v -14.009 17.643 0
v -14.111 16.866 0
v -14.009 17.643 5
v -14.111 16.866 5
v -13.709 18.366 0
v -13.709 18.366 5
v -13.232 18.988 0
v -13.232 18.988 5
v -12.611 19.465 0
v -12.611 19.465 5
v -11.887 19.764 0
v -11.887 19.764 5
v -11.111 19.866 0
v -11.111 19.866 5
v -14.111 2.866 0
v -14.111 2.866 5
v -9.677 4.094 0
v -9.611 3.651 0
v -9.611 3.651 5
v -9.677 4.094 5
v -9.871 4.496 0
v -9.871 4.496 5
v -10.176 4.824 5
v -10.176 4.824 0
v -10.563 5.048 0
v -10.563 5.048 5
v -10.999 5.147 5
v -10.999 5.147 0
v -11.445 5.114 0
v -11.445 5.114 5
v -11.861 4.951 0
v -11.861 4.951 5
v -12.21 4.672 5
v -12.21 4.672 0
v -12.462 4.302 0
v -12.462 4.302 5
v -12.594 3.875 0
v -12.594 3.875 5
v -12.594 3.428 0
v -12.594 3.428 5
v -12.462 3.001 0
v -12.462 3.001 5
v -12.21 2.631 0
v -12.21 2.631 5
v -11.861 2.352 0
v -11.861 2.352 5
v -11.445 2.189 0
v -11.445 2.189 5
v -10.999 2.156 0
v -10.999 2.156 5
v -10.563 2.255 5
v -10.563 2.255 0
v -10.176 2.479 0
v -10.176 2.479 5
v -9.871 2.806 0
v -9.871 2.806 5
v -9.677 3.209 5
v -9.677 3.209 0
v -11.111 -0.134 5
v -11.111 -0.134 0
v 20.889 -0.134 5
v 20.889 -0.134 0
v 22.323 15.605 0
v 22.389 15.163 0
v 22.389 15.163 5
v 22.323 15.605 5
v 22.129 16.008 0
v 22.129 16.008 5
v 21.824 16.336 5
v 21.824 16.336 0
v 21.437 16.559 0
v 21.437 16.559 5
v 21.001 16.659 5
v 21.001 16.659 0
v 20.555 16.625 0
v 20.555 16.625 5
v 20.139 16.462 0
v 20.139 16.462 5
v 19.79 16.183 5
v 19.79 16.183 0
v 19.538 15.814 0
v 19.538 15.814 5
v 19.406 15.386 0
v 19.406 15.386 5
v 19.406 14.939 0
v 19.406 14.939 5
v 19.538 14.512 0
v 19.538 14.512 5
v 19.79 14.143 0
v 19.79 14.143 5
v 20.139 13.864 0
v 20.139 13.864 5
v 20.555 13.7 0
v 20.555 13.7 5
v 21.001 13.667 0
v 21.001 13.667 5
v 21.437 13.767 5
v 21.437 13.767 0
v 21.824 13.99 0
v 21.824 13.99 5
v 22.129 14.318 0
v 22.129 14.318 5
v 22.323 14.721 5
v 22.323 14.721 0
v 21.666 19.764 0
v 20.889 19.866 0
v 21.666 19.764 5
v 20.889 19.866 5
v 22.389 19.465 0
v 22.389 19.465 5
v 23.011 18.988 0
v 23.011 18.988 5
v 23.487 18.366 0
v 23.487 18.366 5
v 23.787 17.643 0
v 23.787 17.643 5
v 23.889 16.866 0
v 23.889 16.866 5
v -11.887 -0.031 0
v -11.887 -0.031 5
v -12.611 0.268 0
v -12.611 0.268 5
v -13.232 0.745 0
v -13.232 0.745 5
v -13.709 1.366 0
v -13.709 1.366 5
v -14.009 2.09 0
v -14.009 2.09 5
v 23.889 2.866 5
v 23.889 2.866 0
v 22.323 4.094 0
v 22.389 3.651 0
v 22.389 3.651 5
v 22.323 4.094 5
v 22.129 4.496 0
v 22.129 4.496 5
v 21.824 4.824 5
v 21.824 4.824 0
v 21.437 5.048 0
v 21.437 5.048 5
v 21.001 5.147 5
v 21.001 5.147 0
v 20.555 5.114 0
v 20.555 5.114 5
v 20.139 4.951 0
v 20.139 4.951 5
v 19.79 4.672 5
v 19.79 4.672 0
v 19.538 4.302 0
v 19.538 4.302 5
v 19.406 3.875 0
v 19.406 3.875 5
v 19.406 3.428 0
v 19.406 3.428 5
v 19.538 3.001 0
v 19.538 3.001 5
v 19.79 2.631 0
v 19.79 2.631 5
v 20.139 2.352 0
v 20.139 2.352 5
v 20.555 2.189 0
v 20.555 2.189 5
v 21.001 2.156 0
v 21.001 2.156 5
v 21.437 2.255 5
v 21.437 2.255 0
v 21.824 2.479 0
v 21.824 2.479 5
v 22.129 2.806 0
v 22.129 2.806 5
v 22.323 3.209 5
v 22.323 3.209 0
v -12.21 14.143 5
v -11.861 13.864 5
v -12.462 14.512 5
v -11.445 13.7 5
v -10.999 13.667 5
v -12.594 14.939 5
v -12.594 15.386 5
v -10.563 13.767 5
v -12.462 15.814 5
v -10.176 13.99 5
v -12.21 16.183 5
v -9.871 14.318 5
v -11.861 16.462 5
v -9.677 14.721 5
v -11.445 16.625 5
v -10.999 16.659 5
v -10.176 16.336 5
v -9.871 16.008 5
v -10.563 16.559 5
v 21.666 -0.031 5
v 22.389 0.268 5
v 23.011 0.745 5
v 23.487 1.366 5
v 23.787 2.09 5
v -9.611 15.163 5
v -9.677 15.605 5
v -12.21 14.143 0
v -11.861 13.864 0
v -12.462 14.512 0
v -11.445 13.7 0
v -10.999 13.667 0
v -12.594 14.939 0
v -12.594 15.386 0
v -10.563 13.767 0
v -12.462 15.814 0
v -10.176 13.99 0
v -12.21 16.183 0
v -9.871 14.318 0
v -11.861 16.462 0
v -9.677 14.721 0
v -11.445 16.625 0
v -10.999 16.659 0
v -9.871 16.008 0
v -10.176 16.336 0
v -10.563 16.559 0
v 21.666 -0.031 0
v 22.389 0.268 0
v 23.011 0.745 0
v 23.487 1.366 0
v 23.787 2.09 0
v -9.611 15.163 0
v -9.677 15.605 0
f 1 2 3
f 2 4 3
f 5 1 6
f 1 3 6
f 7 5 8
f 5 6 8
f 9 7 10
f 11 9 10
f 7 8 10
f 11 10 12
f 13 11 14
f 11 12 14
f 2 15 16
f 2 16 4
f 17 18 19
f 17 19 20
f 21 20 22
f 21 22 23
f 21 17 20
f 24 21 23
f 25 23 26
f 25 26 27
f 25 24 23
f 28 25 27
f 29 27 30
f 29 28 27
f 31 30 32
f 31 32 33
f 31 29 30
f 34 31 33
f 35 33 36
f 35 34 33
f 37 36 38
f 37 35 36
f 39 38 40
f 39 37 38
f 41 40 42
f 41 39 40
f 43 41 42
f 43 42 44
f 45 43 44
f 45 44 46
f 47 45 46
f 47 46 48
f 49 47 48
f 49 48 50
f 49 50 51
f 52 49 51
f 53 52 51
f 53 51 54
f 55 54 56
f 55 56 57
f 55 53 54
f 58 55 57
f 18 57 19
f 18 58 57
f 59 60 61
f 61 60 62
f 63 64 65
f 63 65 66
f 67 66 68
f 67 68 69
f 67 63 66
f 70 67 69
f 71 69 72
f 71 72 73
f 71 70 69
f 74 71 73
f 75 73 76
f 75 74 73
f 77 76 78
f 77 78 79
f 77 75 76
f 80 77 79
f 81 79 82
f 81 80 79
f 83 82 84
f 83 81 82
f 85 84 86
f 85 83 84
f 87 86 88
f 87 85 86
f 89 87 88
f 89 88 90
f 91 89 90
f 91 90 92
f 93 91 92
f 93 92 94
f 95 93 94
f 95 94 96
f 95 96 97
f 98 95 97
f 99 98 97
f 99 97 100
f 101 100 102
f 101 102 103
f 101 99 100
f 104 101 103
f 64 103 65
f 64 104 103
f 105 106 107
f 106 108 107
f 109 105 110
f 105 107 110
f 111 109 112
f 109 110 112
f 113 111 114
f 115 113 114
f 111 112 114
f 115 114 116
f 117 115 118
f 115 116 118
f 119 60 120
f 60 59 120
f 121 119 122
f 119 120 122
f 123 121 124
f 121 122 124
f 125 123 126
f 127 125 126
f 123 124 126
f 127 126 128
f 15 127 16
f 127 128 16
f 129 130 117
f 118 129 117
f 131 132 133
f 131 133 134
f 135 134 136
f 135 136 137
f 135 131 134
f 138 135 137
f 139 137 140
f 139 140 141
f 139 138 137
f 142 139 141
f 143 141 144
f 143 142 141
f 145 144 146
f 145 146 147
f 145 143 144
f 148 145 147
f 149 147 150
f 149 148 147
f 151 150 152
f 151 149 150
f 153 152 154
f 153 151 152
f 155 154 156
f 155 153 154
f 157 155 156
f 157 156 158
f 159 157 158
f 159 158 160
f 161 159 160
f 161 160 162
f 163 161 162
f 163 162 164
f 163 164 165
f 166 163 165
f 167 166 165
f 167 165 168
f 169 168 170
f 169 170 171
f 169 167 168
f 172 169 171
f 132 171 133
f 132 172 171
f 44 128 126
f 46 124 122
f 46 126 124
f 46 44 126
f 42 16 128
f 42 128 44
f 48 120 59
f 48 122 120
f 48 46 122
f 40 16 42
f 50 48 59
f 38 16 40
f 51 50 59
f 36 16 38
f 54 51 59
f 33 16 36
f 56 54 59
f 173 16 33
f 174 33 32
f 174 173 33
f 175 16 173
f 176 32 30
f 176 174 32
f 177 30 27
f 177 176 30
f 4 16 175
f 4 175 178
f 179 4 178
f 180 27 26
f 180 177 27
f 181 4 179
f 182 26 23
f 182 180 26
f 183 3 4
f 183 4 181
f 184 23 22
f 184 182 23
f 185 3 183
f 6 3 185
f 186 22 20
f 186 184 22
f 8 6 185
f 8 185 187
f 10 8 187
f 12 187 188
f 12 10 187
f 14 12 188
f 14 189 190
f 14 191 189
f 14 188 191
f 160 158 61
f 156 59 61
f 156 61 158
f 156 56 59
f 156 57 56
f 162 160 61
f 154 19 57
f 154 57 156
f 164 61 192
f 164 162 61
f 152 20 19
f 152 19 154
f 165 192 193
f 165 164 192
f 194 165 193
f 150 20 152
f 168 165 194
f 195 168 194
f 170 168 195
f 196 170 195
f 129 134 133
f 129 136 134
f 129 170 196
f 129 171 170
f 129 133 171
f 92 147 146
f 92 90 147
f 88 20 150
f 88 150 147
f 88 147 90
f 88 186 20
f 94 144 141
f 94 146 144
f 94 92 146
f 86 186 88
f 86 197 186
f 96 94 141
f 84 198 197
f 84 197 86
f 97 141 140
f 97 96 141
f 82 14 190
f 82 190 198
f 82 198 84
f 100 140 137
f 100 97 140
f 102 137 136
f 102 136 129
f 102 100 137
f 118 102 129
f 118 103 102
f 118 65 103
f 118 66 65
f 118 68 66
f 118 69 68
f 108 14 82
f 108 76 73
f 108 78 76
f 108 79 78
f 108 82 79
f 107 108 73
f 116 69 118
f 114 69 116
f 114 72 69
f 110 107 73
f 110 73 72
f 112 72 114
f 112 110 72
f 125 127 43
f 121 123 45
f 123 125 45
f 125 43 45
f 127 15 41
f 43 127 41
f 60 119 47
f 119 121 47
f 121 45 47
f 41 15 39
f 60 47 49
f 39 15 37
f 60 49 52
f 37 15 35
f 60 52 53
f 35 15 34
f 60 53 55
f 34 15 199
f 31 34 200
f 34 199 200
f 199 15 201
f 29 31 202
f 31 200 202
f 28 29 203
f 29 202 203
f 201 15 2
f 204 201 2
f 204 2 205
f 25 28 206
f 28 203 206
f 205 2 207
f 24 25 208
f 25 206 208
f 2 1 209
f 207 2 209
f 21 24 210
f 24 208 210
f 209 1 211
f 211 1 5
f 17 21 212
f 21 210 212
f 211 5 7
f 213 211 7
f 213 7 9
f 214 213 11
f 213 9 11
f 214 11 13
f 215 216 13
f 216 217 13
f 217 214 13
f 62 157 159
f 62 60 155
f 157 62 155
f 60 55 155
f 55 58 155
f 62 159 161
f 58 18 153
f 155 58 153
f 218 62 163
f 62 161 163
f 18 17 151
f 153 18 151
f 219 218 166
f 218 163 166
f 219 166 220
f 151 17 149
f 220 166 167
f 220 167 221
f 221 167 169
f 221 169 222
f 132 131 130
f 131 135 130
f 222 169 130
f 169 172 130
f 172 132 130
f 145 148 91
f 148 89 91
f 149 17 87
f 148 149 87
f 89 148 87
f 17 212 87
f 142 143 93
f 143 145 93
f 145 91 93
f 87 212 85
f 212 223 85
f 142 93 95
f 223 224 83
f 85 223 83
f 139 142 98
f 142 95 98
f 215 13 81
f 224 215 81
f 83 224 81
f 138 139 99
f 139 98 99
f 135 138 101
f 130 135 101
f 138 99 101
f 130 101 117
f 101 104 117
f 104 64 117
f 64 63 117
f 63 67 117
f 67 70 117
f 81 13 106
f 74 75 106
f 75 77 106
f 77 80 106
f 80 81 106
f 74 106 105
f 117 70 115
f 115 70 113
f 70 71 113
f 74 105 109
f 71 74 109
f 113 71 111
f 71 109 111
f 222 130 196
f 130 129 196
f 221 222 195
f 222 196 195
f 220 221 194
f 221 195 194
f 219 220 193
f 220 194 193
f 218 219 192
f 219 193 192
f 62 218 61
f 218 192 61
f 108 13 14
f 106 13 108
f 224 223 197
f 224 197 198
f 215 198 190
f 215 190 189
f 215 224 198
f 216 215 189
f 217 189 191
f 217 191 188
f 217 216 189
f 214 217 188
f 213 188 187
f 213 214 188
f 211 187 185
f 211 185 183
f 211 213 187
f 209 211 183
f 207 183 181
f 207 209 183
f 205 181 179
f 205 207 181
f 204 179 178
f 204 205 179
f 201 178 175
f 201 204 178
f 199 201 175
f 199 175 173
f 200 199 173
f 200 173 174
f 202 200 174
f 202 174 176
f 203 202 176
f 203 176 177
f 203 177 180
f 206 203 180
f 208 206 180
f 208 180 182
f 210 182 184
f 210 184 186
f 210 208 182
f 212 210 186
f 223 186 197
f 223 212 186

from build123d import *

# Parameters (mm, degrees)
SKETCH1_W           = 38
SKETCH1_H           = 20
SKETCH1_R           = 1.5
BOSS_EXTRUDE1_DEPTH = 5
FILLET1_R           = 3
FILLET2_R           = 3
FILLET3_R           = 3
FILLET4_R           = 3


with BuildPart() as part:
    # Sketch1 → Boss-Extrude1 (new body)
    with BuildSketch(Plane.XY):
        with Locations((4.889250814, 9.866449511)):
            Rectangle(SKETCH1_W, SKETCH1_H)
        with Locations((-11.110749186, 15.16286645)):
            Circle(SKETCH1_R, mode=Mode.SUBTRACT)
        with Locations((-11.110749186, 3.651465798)):
            Circle(SKETCH1_R, mode=Mode.SUBTRACT)
        with Locations((20.889250814, 15.16286645)):
            Circle(SKETCH1_R, mode=Mode.SUBTRACT)
        with Locations((20.889250814, 3.651465798)):
            Circle(SKETCH1_R, mode=Mode.SUBTRACT)
    extrude(amount=BOSS_EXTRUDE1_DEPTH)

    # Fillet1
    fillet1_edges = [part.edges().sort_by_distance(p)[0] for p in [
        (23.889250814, 19.866449511, 2.5),
    ]]
    fillet(fillet1_edges, radius=FILLET1_R)

    # Fillet2
    fillet2_edges = [part.edges().sort_by_distance(p)[0] for p in [
        (23.889250814, -0.133550489, 2.5),
    ]]
    fillet(fillet2_edges, radius=FILLET2_R)

    # Fillet3
    fillet3_edges = [part.edges().sort_by_distance(p)[0] for p in [
        (-14.110749186, -0.133550489, 2.5),
    ]]
    fillet(fillet3_edges, radius=FILLET3_R)

    # Fillet4
    fillet4_edges = [part.edges().sort_by_distance(p)[0] for p in [
        (-14.110749186, 19.866449511, 2.5),
    ]]
    fillet(fillet4_edges, radius=FILLET4_R)


solid = part.part
